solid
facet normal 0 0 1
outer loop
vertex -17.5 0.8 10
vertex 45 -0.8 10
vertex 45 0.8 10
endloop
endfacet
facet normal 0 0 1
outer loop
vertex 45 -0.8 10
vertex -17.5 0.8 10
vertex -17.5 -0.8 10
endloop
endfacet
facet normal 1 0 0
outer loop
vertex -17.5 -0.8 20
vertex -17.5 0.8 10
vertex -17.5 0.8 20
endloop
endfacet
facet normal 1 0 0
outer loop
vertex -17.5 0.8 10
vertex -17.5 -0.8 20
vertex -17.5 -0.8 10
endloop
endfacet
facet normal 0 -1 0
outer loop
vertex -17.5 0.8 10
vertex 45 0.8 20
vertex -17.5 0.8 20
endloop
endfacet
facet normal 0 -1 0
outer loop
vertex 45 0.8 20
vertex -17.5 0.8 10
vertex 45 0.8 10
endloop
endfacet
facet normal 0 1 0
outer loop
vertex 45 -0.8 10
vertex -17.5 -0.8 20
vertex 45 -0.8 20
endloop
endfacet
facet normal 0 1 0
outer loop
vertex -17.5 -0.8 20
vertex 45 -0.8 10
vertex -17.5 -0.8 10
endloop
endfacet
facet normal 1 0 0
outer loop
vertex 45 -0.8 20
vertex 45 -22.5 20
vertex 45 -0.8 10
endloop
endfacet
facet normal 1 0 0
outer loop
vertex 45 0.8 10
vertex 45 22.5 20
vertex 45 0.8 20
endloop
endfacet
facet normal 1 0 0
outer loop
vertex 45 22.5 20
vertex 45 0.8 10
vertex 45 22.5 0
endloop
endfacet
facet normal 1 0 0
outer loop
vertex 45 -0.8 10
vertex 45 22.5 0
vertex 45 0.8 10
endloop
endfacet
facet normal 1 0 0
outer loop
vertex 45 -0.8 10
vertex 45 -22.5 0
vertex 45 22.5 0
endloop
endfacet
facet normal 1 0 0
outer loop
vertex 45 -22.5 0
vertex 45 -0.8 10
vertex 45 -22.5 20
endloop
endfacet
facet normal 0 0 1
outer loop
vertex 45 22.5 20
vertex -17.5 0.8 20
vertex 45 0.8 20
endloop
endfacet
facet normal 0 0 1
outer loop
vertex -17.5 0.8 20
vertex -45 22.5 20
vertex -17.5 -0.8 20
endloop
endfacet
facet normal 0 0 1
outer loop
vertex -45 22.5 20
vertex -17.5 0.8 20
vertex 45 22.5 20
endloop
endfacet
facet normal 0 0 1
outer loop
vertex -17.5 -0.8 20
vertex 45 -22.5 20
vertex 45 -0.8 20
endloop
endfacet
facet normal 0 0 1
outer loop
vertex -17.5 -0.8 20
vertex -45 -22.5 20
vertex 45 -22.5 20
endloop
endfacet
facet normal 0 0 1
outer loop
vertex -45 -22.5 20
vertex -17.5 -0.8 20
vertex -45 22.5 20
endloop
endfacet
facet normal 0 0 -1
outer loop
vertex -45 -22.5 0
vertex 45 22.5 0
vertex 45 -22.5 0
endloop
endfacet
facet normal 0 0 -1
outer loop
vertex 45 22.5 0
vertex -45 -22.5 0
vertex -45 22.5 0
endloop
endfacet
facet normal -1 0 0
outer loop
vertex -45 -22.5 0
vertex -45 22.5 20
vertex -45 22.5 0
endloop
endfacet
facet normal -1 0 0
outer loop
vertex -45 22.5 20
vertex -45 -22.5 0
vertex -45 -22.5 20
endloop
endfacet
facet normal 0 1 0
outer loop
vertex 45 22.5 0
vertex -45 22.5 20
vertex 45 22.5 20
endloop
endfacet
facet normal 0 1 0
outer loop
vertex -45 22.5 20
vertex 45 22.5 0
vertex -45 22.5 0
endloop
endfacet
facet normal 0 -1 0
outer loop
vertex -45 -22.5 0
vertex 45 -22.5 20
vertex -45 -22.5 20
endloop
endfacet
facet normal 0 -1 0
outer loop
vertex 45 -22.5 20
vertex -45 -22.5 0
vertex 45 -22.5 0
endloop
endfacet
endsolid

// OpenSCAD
// Slide drying rack
// Print orientation: base on XY plane, slots open upward (+Z)

// ---------- Block ----------
block_l = 90;    // block length along X (mm)
block_w = 45;    // block width along Y (mm)
block_h = 20;    // block height along Z (mm)

// ---------- Slots ----------
slot_n     = 10;   // number of slide slots
slot_len   = 77;   // slot length along X (mm)
slot_w     = 1.6;  // slot width along Y (mm)
slot_depth = 10;   // slot depth into block (mm)
slot_pitch = 3.5;  // centre-to-centre spacing along Y (mm)

// ---------- Misc ----------
eps = 0.5;       // overcut past faces to avoid coplanar faces
$fn = 64;       // curve resolution (no curves used, kept per convention)

// X position of first slot centre (group centred on block)
slot_x0 = -(slot_n * slot_pitch - slot_len) / 2;

difference() {
    // Base block
    translate([-block_l / 2, -block_w / 2, 0])
        cube([block_l, block_w, block_h]);

    // Parallel slots open at the top
    for (i = [0 : slot_n - 1]) {
        translate([slot_x0 + i * slot_pitch - slot_len / 2,
                   -slot_w / 2,
                   block_h - slot_depth])
            cube([slot_len, slot_w, slot_depth + eps]);
    }
}
